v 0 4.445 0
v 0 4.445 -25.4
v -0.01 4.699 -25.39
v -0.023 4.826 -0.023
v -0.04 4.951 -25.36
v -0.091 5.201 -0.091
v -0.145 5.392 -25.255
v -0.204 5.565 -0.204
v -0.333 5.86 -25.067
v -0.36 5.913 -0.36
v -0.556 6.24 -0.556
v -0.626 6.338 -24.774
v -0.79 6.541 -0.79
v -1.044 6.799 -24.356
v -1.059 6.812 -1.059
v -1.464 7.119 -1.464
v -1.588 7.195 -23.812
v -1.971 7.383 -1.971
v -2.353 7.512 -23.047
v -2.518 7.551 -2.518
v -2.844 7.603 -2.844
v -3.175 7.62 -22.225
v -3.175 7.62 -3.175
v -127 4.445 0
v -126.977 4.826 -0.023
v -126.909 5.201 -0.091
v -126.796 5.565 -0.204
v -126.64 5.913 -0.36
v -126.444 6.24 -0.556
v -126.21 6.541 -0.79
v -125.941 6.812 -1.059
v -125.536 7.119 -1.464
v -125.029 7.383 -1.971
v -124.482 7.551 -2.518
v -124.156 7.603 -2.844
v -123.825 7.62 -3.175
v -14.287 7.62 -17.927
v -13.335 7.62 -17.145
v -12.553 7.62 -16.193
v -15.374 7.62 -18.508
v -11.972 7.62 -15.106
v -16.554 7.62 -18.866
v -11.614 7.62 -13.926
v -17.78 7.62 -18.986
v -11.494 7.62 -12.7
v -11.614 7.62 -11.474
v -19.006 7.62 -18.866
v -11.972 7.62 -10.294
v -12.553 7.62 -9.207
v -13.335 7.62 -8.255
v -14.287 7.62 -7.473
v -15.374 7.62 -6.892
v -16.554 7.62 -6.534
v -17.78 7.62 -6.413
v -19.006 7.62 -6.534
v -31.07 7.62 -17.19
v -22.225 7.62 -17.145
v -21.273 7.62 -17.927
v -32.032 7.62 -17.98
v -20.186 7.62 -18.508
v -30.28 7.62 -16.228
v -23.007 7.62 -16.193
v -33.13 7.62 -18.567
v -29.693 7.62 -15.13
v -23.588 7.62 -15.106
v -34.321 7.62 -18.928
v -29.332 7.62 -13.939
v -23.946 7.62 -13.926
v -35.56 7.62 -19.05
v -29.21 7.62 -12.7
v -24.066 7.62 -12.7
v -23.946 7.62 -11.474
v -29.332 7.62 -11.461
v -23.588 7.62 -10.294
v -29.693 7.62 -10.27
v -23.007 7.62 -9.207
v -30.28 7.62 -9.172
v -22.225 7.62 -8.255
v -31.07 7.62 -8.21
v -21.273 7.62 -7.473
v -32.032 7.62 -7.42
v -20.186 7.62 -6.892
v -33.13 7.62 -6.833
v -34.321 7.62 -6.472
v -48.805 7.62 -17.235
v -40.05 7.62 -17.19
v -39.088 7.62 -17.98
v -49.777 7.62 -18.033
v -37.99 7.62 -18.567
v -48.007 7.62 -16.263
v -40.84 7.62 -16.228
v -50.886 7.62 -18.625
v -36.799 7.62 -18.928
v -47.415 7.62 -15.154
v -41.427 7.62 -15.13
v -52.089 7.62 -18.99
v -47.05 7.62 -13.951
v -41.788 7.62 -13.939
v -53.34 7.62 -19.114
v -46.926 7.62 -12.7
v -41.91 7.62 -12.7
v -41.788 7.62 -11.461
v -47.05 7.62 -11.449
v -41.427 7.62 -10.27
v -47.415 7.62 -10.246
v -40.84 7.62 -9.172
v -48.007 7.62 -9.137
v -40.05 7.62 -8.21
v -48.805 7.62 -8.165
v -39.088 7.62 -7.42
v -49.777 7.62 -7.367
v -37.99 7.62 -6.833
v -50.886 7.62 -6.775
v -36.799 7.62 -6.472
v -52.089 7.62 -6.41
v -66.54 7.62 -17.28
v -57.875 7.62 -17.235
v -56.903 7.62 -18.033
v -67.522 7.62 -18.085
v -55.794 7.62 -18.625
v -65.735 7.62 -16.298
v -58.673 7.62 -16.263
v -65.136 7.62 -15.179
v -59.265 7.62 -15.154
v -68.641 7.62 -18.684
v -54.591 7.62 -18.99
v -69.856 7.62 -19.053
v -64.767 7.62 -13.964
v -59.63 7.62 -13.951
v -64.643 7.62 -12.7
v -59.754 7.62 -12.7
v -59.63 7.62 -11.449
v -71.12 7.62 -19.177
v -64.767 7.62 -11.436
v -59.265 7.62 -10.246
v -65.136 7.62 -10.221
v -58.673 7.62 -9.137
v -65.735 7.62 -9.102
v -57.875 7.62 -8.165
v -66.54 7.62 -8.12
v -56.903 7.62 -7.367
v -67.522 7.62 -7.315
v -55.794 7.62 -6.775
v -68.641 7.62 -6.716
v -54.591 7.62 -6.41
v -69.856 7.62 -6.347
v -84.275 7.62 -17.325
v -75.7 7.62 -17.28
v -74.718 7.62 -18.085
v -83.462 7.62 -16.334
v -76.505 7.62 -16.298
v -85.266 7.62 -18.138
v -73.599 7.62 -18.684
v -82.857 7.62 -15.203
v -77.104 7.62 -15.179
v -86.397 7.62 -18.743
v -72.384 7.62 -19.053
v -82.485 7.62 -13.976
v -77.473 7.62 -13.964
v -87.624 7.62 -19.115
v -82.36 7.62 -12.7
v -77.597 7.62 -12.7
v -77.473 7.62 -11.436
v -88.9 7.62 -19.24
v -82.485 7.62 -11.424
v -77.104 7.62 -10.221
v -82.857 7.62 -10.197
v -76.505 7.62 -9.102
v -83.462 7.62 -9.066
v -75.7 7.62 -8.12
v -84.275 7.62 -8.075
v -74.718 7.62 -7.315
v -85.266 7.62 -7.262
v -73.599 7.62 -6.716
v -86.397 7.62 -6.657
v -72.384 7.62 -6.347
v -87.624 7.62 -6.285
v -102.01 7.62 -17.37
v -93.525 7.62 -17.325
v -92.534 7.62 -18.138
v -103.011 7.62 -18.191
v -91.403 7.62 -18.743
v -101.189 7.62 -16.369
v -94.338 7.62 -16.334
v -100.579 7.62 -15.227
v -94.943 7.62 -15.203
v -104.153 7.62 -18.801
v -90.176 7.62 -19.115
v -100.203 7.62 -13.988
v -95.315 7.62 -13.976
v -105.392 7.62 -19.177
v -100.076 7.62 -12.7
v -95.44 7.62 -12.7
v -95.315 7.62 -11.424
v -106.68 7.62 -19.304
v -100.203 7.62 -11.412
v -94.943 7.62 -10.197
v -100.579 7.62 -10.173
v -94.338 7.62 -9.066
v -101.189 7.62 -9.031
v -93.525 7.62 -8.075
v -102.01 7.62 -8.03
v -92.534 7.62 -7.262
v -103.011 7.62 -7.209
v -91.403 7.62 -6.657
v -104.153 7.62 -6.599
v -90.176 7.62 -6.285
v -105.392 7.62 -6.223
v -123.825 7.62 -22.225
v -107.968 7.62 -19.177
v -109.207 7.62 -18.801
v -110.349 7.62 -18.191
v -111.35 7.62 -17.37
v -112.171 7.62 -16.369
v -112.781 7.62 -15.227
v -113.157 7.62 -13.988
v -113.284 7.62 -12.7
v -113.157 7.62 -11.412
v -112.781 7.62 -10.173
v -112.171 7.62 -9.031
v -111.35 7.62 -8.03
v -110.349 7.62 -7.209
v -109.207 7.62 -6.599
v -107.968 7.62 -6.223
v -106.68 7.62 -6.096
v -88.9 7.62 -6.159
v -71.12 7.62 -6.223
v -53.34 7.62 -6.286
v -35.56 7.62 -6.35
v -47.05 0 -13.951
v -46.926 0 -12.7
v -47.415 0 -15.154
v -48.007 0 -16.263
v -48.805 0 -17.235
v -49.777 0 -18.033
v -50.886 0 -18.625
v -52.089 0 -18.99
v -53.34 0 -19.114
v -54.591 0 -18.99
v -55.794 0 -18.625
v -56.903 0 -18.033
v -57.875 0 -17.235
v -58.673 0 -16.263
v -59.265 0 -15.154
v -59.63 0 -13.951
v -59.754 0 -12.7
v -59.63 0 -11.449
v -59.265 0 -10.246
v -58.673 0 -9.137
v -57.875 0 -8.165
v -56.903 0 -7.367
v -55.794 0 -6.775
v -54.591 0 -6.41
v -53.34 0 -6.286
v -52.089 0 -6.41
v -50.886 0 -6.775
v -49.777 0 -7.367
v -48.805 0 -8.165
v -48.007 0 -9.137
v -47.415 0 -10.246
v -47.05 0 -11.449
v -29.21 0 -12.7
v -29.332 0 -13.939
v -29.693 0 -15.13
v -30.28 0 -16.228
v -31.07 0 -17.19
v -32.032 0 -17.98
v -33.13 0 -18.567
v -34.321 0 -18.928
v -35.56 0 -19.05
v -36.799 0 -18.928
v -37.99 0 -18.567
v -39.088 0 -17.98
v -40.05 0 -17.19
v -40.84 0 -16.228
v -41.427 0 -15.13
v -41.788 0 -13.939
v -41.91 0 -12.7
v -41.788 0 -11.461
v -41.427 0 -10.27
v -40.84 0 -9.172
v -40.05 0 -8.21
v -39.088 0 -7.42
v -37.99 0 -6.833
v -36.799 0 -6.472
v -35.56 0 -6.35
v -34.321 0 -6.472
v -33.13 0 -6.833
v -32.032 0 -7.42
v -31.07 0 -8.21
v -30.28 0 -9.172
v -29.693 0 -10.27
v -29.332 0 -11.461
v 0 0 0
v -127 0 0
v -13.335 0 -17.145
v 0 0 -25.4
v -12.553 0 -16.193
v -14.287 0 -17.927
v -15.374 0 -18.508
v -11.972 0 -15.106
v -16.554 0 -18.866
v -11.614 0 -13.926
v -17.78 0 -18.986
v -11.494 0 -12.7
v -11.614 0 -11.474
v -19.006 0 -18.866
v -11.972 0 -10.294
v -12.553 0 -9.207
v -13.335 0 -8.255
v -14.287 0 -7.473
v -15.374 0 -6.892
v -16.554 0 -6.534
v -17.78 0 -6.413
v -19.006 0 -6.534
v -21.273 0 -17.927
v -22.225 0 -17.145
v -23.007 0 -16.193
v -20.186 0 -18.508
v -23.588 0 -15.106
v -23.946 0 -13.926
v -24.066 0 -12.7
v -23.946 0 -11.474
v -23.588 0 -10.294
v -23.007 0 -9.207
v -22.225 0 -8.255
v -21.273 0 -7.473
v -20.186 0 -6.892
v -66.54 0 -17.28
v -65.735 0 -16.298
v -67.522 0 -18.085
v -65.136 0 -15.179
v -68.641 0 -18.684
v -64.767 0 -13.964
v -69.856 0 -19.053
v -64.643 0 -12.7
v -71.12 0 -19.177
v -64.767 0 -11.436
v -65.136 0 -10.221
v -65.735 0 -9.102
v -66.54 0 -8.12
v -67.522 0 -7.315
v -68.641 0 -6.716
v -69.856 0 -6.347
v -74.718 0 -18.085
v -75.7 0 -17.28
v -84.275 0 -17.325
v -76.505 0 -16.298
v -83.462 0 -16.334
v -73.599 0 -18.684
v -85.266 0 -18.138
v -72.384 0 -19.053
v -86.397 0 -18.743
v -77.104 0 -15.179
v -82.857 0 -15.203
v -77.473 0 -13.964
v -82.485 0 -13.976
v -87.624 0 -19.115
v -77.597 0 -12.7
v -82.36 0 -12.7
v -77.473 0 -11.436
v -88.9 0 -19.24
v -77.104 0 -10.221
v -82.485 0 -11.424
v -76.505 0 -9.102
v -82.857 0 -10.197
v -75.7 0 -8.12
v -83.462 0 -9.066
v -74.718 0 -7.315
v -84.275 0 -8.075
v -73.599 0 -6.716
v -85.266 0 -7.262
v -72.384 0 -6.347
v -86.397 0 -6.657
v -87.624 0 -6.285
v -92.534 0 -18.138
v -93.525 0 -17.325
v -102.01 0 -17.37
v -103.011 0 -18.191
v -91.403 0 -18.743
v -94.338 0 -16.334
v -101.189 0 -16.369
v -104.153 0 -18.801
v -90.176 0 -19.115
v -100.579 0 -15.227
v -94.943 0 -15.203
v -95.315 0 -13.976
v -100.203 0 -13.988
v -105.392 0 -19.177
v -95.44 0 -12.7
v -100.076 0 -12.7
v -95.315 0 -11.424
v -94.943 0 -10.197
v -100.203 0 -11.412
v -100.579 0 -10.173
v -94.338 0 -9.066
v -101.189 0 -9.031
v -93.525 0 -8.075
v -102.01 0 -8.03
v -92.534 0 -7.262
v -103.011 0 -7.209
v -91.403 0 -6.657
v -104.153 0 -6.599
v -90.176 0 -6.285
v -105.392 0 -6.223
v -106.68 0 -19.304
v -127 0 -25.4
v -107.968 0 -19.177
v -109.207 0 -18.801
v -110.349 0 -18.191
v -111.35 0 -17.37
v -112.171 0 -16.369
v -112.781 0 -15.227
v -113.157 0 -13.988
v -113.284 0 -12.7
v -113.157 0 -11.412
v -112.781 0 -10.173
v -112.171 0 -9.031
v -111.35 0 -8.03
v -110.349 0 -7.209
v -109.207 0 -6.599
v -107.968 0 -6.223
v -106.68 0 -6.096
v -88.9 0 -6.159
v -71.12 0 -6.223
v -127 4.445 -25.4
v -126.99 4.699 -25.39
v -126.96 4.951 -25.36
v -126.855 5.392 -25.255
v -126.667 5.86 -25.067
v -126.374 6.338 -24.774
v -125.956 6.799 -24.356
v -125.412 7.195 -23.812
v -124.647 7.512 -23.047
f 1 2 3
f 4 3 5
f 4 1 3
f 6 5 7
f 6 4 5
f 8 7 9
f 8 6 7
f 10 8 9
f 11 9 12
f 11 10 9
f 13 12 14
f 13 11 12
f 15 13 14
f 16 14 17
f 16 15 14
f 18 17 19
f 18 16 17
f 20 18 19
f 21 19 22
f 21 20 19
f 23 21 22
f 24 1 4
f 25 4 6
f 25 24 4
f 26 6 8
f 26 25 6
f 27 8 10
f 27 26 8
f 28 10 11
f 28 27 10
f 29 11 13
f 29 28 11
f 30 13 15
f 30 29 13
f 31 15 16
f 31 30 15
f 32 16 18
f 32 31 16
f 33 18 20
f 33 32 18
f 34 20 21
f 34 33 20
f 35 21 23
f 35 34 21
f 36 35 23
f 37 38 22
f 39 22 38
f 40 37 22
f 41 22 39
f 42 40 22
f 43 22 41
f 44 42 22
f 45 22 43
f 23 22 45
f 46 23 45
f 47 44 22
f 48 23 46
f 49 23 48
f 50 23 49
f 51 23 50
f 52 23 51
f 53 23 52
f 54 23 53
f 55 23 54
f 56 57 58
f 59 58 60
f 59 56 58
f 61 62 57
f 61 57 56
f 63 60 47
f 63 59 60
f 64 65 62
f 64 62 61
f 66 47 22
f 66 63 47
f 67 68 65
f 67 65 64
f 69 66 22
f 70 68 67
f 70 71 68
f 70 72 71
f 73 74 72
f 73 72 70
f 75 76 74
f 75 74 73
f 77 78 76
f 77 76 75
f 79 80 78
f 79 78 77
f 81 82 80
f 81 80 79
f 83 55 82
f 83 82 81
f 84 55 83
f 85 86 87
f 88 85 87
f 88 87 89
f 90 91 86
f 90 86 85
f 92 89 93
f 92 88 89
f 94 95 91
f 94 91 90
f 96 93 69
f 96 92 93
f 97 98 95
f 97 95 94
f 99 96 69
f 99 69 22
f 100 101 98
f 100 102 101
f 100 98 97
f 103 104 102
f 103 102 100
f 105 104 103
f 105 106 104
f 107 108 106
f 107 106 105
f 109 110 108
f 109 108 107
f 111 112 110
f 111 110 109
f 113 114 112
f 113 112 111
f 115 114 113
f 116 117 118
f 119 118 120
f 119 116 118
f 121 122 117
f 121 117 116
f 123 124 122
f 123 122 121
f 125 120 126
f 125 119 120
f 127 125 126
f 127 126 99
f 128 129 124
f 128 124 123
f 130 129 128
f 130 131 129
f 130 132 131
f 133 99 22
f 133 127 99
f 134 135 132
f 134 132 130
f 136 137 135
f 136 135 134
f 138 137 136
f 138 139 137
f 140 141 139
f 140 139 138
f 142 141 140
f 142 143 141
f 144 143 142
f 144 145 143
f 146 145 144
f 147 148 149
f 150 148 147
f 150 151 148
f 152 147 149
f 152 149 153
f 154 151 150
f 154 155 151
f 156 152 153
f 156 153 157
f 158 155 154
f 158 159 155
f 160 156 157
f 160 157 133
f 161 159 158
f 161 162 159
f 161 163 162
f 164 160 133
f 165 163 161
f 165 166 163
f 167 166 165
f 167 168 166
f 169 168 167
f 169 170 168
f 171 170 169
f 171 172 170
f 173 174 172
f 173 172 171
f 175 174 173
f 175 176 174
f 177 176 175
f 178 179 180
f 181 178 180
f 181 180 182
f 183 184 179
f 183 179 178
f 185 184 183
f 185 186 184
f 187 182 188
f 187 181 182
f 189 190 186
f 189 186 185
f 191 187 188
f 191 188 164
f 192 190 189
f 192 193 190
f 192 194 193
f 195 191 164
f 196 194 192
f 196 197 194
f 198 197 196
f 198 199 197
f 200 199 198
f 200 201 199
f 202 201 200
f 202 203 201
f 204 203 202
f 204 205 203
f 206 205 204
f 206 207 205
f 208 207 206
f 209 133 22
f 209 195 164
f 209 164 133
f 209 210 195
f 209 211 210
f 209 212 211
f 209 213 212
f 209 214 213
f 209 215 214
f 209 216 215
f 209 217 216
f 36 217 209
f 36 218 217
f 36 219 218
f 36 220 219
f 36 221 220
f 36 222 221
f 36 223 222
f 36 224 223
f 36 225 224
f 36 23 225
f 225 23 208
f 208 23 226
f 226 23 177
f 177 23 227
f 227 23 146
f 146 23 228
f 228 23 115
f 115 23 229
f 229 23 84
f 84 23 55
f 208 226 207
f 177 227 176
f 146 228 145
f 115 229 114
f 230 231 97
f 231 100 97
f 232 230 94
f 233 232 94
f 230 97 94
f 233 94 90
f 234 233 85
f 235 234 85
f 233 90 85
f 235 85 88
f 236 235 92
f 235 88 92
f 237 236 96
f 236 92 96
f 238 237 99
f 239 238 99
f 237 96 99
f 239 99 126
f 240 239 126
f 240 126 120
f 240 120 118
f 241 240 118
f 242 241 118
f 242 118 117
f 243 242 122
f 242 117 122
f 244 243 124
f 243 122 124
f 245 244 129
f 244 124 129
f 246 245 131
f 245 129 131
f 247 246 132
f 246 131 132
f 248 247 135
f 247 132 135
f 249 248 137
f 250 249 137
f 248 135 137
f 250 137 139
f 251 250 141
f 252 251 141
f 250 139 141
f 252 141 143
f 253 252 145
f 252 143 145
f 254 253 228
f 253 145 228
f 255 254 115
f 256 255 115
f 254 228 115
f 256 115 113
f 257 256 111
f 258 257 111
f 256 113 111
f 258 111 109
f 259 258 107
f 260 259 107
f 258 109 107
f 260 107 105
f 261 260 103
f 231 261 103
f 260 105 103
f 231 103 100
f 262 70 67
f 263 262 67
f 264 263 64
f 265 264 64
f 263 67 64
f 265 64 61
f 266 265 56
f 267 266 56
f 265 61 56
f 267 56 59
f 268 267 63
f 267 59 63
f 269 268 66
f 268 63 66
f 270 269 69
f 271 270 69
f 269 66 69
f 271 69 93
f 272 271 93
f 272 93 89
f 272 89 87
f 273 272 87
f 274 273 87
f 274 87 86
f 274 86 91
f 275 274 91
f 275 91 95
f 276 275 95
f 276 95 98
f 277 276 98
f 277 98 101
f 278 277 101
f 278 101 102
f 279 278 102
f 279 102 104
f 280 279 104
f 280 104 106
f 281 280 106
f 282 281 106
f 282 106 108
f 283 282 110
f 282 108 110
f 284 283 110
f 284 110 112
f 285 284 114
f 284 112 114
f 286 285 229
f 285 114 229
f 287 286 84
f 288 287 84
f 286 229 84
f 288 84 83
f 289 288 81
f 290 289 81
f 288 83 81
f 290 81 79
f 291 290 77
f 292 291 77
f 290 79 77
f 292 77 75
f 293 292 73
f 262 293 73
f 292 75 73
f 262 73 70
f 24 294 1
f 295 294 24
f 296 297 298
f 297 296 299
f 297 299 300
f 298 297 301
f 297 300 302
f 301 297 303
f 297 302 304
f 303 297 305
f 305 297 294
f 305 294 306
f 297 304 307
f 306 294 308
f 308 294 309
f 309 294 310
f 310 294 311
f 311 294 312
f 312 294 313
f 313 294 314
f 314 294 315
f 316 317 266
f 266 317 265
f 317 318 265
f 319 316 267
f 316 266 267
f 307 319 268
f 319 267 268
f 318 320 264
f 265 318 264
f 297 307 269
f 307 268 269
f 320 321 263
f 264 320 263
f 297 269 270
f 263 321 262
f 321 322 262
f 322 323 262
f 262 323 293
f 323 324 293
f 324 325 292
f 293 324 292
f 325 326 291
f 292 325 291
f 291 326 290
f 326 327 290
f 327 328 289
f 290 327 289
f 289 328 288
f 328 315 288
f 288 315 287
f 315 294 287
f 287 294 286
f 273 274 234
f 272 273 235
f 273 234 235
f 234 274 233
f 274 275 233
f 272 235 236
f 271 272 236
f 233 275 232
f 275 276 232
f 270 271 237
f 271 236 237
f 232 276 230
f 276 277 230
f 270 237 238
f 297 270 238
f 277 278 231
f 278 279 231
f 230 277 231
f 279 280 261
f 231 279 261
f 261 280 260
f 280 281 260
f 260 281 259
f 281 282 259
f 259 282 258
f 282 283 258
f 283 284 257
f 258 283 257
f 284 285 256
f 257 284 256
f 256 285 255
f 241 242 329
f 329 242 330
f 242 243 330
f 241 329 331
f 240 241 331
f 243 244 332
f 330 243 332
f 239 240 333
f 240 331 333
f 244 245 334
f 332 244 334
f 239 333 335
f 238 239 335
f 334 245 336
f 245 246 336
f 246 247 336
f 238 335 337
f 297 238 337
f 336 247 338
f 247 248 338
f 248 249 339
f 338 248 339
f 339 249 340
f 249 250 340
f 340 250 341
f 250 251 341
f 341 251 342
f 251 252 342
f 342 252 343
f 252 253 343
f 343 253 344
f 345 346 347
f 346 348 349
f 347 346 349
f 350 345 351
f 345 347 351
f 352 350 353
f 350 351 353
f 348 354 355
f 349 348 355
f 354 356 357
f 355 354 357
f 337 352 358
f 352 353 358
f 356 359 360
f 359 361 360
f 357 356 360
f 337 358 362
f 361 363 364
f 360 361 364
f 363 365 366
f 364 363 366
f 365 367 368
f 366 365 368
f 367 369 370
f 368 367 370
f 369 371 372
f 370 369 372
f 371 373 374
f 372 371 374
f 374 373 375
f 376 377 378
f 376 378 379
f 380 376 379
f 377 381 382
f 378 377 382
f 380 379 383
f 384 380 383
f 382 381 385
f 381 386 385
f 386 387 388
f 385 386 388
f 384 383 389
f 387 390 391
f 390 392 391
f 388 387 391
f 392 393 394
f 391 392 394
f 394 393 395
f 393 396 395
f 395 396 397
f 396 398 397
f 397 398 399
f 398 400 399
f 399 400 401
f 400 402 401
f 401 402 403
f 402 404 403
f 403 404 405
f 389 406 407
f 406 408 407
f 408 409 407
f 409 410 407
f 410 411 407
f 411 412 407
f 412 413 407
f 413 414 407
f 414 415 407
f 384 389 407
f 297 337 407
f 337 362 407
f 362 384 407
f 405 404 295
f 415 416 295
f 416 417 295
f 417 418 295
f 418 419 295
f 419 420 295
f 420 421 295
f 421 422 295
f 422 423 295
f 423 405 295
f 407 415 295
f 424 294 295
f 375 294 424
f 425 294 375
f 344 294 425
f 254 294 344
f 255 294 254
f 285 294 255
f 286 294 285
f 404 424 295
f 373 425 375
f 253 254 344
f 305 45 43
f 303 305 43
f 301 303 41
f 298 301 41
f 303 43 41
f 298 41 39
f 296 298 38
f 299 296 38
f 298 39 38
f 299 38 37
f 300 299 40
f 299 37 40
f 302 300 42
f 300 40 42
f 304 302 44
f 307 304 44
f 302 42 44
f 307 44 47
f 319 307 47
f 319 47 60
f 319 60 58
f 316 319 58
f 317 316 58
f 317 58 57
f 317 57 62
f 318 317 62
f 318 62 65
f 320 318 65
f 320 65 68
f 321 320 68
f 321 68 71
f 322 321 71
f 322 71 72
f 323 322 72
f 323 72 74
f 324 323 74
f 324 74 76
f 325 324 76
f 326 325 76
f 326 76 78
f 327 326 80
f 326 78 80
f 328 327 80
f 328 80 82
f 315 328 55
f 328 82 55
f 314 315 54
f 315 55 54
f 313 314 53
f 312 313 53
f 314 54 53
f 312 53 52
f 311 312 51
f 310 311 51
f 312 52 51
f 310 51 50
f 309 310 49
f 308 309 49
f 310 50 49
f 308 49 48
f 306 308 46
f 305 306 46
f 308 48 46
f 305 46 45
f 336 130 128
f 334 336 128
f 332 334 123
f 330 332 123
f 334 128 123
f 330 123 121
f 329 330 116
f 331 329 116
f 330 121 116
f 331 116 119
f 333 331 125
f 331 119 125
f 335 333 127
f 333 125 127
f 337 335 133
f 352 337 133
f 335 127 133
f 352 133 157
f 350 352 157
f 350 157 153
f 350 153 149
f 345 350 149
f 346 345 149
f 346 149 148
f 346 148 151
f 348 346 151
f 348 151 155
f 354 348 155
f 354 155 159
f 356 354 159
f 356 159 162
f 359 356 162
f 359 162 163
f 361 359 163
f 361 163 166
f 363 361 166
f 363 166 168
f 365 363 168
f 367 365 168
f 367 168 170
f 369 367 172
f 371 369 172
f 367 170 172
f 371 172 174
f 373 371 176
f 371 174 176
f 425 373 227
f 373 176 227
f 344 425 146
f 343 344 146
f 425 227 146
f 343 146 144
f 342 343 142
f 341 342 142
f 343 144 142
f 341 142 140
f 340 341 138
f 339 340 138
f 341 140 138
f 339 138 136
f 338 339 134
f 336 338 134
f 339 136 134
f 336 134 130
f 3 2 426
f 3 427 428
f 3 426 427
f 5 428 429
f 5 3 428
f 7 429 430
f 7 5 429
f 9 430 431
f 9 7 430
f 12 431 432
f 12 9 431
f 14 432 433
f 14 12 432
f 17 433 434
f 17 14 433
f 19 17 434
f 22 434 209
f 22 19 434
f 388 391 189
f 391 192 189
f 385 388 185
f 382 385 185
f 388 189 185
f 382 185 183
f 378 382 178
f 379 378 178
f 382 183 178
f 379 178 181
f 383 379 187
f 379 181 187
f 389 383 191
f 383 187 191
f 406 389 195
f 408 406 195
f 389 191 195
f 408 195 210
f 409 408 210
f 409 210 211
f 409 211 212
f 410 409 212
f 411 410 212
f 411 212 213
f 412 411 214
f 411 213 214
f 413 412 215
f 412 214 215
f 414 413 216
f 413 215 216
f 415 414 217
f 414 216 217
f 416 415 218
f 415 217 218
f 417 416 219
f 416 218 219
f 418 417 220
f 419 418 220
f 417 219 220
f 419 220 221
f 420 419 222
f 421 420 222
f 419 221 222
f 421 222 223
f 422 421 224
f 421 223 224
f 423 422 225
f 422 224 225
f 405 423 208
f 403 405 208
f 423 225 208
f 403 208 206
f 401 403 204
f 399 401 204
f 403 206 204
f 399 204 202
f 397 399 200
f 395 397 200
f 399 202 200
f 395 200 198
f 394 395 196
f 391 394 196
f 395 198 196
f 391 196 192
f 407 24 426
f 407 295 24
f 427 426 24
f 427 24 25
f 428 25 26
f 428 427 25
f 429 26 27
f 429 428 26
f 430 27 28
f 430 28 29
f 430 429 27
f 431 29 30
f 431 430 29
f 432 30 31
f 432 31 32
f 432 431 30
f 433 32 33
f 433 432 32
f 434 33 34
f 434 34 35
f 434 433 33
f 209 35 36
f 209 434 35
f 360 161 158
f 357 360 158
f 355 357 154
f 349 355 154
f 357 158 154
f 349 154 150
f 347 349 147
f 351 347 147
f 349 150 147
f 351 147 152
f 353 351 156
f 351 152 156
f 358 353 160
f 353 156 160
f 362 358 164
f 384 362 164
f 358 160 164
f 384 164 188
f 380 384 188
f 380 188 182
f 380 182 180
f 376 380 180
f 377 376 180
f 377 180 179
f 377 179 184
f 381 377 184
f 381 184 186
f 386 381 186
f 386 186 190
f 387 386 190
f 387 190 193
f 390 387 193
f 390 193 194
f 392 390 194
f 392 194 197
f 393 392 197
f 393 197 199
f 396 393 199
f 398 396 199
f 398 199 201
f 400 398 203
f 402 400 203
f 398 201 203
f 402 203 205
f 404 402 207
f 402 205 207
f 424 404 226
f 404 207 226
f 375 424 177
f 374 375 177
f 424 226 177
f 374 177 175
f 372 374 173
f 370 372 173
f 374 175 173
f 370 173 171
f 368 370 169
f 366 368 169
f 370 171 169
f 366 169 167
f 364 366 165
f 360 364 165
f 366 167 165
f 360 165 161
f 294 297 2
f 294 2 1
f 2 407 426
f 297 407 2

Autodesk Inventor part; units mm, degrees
ref_plane "YZ Plane" through (0, 0, 0) normal (1, 0, 0) x (0, 1, 0)
ref_plane "XZ Plane" through (0, 0, 0) normal (0, 1, 0) x (-1, 0, 0)
ref_plane "XY Plane" through (0, 0, 0) normal (0, 0, 1) x (1, 0, 0)
sketch "Sketch1" plane through (0, 0, 0) normal (0, 1, 0) x (-1, 0, 0)
  line L0 (0, 0) -> (127, 0)
  line L1 (127, 0) -> (127, -25.4)
  line L2 (127, -25.4) -> (0, -25.4)
  line L3 (0, -25.4) -> (0, 0)
  dimension "d0" = 127
  dimension "d1" = 25.4
extrude "Extrusion1" add sketch "Sketch1" along normal blind 7.62
sketch "Sketch2" plane through (0, 7.62, 0) normal (0, 1, 0) x (1, 0, 0)
  circle A0 centre (-17.78, 12.7) radius 6.2865
  circle A1 centre (-35.56, 12.7) radius 6.35
  circle A2 centre (-53.34, 12.7) radius 6.4135
  circle A3 centre (-71.12, 12.7) radius 6.477
  circle A4 centre (-88.9, 12.7) radius 6.5405
  circle A5 centre (-106.68, 12.7) radius 6.604
  line L0 (0, 0) -> (0, 25.4) projected
  dimension "d4" = 12.573
  dimension "d5" = 12.7
  dimension "d6" = 12.827
  dimension "d7" = 12.954
  dimension "d8" = 13.081
  dimension "d9" = 13.208
  dimension "d10" = 17.78
  dimension "d11" = 17.78
  dimension "d12" = 17.78
  dimension "d13" = 17.78
  dimension "d14" = 17.78
  dimension "d15" = 17.78
extrude "Extrusion2" cut sketch "Sketch2" against normal through all
fillet "Fillet1" radius 3.175 4 edges at (-63.5, 7.62, 0) (-63.5, 7.62, -25.4) (0, 7.62, -12.7) (-127, 7.62, -12.7)
properties part number "Bearing hole test"
